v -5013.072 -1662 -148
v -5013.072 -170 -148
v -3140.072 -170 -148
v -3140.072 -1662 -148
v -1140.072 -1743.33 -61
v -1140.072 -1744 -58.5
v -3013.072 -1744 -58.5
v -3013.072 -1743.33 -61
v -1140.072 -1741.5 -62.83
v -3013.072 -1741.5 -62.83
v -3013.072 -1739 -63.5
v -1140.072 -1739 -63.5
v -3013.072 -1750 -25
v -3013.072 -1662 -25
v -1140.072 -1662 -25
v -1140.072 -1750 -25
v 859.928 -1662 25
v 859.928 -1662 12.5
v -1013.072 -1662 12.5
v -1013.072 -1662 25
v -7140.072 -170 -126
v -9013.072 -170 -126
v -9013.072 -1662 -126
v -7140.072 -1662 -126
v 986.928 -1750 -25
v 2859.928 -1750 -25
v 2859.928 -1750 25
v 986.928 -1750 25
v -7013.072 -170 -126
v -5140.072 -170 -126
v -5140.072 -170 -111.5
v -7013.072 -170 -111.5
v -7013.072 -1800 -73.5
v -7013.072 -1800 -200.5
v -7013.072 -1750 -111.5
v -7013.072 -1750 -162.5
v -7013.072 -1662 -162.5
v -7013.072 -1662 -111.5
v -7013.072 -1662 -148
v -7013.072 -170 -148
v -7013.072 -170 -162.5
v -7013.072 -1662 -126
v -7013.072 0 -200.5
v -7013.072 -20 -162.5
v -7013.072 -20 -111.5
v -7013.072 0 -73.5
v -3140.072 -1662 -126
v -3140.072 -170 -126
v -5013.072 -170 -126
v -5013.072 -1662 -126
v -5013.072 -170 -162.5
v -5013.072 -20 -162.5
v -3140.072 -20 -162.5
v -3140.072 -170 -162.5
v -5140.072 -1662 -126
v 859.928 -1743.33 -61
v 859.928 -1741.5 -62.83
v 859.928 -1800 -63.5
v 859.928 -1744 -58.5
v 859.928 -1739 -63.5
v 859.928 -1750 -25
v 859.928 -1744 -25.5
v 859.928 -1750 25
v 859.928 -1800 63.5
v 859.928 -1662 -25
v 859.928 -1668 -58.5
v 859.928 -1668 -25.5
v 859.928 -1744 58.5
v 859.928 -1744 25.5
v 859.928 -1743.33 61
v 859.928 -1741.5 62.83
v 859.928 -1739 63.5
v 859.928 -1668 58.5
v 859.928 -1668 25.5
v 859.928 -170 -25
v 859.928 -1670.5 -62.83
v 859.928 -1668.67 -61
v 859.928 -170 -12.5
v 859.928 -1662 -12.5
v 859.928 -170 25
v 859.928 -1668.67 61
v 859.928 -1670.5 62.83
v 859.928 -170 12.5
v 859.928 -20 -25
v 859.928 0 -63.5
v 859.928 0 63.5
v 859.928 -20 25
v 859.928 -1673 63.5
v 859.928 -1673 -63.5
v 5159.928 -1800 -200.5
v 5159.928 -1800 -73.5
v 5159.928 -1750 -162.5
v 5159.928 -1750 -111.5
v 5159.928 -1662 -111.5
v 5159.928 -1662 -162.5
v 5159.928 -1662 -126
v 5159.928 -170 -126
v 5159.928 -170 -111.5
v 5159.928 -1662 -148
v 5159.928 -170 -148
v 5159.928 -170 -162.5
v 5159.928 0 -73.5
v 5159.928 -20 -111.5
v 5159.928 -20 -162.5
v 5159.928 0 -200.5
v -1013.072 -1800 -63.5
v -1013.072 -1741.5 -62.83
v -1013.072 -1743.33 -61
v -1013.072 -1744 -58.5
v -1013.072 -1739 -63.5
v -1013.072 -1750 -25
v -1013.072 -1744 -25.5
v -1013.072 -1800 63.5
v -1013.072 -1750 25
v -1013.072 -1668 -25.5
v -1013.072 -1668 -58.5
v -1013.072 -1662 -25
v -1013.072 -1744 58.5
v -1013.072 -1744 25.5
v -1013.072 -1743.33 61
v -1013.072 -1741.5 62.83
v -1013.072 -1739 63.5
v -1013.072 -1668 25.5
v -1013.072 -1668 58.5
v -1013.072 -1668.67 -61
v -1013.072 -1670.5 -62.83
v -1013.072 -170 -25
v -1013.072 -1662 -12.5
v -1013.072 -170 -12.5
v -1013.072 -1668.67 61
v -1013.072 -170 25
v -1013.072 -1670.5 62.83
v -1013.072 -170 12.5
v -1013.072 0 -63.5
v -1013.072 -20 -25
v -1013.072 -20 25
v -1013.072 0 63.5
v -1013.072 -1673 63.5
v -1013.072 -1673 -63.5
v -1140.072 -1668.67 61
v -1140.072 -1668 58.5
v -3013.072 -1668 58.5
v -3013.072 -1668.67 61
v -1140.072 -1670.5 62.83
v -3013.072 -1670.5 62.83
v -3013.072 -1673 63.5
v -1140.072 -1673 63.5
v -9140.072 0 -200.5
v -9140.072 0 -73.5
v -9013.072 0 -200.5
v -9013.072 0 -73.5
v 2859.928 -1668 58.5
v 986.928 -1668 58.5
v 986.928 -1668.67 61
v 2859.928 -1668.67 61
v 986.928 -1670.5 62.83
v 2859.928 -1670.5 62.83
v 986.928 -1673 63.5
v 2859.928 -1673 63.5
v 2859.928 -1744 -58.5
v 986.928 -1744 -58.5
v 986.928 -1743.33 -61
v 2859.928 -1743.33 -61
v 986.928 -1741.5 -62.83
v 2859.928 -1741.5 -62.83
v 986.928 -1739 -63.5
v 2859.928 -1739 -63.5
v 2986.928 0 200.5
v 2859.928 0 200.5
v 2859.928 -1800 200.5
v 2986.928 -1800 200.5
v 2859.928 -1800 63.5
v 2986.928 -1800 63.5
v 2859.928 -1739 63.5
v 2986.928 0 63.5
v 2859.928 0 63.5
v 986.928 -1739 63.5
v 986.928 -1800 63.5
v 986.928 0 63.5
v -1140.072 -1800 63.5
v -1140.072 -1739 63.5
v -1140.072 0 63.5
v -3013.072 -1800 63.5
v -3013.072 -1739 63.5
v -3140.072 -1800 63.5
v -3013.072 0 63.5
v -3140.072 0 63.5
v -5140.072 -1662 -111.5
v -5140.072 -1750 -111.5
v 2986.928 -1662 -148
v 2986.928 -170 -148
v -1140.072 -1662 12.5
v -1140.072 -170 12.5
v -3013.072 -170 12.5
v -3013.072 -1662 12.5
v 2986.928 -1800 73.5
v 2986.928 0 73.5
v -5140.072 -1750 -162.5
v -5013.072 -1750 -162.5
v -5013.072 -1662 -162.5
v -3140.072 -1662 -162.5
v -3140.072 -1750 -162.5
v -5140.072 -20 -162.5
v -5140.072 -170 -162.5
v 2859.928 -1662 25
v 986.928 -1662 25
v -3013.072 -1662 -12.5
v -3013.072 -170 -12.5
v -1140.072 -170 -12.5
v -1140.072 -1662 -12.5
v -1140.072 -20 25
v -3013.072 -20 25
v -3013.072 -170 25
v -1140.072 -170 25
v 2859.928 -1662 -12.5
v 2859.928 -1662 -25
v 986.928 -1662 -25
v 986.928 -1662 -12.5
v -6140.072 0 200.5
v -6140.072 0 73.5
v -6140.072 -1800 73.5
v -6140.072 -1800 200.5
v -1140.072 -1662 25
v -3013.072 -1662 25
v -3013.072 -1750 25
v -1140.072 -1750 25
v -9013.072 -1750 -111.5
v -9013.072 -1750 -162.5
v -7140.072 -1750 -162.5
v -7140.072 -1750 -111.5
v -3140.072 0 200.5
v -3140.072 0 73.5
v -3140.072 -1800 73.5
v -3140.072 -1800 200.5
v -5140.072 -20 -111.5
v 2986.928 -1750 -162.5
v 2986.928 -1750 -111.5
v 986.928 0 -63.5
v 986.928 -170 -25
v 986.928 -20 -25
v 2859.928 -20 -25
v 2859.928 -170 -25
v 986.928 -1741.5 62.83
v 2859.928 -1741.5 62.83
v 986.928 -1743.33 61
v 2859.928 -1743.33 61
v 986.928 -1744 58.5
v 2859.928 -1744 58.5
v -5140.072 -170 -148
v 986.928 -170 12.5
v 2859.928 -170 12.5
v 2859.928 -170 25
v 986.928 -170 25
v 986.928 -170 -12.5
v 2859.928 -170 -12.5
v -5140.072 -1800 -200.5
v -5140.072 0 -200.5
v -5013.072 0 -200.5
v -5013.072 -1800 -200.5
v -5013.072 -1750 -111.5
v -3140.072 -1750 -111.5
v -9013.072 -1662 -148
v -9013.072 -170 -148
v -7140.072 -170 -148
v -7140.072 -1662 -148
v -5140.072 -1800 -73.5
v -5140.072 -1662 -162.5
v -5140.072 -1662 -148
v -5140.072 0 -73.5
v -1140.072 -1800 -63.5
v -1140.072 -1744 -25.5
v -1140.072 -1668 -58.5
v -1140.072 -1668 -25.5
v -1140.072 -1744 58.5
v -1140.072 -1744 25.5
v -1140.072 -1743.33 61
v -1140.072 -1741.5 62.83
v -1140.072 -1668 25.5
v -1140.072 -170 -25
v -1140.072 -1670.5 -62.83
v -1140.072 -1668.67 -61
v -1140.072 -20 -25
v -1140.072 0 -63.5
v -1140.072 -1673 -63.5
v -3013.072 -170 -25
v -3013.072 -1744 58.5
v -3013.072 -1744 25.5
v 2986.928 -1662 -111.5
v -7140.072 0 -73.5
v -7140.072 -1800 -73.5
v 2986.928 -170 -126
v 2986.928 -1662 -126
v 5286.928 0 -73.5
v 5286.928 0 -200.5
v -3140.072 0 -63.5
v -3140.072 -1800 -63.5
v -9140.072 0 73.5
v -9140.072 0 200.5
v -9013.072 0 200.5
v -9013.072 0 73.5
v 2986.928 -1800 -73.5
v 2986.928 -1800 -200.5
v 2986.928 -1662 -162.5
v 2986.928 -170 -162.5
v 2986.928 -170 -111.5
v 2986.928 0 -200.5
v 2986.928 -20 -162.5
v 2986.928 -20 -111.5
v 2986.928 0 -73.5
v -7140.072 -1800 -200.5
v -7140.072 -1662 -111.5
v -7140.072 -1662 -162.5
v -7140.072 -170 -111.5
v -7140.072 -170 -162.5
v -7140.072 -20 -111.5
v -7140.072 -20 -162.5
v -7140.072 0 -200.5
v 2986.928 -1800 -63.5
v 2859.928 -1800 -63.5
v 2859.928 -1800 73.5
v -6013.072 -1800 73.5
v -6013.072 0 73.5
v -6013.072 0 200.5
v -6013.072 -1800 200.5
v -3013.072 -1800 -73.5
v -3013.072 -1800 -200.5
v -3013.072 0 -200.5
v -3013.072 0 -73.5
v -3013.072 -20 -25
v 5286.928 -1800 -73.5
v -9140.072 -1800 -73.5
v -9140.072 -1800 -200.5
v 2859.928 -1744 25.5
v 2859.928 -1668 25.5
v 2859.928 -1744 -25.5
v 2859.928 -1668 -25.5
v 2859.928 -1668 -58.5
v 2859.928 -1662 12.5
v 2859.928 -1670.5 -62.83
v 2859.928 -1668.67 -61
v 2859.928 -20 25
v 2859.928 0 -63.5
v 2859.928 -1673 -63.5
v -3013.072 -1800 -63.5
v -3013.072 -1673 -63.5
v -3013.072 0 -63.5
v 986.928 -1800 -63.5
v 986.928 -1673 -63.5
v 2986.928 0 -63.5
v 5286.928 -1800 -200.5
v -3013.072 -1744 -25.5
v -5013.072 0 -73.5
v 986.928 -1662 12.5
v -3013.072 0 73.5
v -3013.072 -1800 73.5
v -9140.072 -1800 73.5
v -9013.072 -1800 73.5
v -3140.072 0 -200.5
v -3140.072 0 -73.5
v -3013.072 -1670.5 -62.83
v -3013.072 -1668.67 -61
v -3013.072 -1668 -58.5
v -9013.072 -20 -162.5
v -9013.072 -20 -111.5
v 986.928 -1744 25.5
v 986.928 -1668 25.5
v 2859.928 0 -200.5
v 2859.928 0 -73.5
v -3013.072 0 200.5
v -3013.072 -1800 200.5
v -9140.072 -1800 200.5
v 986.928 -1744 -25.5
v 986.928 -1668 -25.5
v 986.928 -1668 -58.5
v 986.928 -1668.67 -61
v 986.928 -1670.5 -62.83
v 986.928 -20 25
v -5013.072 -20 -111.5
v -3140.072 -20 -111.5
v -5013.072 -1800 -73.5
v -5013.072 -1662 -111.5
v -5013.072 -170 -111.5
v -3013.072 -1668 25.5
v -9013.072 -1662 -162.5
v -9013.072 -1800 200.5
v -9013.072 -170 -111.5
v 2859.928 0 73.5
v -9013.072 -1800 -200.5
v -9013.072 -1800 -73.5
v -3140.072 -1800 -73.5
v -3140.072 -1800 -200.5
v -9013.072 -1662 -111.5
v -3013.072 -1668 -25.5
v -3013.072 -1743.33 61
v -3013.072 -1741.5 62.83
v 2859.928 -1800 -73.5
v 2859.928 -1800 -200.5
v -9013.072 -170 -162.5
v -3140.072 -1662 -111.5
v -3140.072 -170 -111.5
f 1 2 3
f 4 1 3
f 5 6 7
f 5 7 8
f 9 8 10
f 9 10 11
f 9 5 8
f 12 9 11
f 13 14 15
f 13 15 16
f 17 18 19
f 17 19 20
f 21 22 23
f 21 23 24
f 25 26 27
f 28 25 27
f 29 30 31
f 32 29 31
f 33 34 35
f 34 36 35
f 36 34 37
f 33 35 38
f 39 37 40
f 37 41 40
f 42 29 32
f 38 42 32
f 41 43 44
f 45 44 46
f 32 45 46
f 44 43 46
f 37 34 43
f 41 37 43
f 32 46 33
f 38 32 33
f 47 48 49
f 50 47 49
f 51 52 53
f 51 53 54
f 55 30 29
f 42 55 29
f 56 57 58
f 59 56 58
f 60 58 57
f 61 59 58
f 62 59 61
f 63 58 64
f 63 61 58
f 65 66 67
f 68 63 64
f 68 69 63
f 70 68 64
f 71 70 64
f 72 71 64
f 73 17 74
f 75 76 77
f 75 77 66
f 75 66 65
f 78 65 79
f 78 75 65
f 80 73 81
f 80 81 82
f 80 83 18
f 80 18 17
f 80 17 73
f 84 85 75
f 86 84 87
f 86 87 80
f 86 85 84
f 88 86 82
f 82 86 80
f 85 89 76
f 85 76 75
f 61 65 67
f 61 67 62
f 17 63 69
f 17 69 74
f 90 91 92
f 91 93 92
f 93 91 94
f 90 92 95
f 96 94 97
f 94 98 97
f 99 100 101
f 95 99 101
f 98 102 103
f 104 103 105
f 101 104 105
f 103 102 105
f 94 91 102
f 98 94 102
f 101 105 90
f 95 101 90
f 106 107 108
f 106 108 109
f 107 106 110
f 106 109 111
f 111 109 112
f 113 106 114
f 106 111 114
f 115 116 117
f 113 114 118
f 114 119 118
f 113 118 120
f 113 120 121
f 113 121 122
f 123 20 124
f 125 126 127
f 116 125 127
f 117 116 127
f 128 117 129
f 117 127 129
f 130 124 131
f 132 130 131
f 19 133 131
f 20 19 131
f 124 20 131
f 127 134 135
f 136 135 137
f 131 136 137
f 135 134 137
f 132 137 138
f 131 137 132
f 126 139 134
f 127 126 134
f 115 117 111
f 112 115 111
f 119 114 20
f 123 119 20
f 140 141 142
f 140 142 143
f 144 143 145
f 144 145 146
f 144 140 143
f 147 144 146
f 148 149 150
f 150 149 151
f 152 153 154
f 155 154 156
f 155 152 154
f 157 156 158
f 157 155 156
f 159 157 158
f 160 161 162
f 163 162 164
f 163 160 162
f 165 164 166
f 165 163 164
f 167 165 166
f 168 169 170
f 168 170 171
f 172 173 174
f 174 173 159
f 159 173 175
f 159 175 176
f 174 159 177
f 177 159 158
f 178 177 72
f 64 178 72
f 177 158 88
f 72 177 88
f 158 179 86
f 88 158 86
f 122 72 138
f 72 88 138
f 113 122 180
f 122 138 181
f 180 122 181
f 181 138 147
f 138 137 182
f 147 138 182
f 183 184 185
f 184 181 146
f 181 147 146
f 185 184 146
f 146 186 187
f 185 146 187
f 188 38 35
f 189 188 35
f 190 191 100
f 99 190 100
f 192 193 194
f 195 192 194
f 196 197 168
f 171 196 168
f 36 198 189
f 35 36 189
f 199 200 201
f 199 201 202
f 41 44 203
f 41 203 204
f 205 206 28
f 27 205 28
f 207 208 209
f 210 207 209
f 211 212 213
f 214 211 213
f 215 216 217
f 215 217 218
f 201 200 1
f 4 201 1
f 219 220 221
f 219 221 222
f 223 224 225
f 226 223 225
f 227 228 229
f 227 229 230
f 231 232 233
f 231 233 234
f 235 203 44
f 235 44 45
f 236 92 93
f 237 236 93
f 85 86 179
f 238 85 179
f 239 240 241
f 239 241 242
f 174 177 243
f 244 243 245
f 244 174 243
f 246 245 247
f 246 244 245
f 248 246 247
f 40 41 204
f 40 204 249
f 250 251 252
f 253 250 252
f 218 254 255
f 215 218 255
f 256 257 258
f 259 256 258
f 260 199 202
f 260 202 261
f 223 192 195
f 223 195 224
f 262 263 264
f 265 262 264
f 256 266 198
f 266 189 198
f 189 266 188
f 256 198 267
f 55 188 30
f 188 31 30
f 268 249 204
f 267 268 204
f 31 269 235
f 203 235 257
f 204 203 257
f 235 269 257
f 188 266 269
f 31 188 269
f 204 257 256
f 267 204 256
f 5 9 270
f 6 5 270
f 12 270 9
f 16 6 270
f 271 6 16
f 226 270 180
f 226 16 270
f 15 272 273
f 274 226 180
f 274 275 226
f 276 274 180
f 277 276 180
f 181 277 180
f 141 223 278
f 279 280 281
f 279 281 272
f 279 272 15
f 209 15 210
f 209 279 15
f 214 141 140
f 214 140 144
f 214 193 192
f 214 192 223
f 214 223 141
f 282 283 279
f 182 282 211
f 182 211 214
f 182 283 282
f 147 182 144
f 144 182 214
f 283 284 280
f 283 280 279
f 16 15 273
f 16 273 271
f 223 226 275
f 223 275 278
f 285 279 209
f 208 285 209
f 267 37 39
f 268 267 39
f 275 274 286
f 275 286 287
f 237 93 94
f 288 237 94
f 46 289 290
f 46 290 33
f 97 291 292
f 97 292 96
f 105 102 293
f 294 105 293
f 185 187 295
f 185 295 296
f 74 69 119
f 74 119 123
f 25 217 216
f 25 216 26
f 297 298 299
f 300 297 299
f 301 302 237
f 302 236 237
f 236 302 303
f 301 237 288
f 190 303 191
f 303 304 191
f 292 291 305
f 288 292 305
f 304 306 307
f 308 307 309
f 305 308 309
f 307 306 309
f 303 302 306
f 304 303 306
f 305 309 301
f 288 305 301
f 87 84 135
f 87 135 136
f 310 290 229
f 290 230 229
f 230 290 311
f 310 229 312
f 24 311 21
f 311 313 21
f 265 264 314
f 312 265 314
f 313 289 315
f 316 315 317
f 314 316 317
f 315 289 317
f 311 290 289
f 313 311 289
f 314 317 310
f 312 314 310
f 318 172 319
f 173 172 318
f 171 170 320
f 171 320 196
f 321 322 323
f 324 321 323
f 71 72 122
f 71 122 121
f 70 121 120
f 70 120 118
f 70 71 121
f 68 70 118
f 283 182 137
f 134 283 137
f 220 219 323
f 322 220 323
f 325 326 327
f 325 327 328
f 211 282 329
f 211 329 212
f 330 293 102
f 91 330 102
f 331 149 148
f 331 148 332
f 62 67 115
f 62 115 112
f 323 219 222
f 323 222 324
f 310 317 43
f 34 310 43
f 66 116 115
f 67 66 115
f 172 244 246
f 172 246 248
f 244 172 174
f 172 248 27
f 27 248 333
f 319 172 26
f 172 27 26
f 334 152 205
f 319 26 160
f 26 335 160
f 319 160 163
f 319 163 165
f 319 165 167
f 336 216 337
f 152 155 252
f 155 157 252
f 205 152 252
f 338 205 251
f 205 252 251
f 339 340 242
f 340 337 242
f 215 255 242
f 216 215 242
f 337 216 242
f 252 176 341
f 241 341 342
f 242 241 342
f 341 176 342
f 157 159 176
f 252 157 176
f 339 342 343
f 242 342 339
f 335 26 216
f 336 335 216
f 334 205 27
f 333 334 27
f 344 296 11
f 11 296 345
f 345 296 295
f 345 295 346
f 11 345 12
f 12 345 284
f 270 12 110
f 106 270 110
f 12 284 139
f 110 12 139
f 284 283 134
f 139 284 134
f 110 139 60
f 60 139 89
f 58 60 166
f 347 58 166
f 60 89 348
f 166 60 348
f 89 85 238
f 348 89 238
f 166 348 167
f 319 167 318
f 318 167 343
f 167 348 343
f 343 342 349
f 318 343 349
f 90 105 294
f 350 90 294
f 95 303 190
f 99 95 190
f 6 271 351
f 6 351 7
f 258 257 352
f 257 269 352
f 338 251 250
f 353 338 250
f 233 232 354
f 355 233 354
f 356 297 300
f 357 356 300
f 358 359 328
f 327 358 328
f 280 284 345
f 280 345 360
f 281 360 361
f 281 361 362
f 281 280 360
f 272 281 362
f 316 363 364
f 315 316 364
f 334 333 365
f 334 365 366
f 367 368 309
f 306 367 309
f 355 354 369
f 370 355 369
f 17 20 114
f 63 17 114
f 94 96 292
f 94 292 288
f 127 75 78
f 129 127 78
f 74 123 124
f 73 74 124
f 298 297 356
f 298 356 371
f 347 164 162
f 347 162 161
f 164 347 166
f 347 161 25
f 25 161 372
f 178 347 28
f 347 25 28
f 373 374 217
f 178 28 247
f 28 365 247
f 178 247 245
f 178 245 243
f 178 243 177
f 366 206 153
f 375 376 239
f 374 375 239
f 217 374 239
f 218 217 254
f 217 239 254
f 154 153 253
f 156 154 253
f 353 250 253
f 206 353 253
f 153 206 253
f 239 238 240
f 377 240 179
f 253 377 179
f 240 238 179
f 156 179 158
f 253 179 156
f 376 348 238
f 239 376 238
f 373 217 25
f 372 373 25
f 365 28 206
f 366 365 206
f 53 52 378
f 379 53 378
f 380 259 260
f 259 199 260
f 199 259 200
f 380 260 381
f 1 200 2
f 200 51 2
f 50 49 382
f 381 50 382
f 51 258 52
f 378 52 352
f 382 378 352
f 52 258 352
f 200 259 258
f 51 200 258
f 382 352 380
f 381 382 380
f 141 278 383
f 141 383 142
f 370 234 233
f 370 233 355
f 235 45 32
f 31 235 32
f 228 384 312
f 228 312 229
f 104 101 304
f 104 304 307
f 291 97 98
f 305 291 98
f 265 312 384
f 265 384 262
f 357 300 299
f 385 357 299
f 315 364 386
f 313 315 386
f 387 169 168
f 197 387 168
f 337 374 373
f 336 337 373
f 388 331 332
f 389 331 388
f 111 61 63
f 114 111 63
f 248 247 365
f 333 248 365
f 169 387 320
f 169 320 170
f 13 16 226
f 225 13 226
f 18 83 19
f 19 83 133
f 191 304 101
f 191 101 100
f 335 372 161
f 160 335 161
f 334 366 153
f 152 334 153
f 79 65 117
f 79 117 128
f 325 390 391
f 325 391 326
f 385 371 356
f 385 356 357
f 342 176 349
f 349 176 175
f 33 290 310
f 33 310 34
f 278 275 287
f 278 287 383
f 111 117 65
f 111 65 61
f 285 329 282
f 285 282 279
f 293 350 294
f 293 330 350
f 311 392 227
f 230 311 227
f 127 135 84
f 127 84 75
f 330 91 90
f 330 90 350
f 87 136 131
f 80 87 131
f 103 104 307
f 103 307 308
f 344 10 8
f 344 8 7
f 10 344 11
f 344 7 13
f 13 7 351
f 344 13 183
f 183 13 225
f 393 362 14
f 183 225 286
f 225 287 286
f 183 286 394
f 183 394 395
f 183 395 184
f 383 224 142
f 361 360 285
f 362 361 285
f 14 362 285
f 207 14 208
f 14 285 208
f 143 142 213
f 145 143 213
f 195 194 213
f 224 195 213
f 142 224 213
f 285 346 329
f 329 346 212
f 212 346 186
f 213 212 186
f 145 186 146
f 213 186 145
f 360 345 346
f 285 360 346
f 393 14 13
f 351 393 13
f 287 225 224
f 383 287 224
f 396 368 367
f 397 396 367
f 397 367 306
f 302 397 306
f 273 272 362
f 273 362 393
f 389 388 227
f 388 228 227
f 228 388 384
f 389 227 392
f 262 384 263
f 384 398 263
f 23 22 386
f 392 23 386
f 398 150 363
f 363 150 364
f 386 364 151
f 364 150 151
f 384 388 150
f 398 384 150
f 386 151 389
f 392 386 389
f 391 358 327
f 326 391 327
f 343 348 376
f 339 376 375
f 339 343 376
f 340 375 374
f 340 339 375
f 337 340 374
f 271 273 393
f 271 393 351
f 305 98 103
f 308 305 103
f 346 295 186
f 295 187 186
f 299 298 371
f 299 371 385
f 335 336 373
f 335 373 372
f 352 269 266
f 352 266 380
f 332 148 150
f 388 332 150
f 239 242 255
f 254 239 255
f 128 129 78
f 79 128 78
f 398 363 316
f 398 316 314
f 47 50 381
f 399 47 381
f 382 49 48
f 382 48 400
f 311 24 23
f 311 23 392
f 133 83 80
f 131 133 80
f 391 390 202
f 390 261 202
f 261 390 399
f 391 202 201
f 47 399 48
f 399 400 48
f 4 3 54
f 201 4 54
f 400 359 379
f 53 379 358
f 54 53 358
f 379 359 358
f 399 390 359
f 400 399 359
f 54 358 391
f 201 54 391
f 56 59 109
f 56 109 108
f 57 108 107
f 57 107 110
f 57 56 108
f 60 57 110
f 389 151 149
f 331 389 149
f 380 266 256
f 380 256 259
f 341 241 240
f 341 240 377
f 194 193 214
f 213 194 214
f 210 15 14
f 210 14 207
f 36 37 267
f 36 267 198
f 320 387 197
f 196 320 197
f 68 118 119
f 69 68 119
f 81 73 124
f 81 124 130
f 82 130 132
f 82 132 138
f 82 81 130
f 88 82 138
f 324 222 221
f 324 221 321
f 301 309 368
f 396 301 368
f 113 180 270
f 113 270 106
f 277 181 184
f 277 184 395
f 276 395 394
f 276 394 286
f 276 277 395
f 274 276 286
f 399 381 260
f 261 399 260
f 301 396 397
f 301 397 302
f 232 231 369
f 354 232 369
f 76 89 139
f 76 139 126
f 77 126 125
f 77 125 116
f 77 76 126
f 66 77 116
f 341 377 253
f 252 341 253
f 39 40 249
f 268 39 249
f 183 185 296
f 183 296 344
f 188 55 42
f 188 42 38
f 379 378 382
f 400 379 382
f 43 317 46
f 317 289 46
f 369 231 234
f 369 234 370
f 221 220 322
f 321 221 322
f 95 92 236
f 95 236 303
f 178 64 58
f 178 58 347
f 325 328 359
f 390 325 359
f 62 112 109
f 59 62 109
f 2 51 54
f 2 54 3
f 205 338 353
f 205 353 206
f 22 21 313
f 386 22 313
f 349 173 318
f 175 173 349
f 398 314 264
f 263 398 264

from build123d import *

# Parameters (mm, degrees)
F0_W        = 1873
F0_H        = 25
F0_W_2      = 63.5
F0_W_3      = 127
F0_H_2      = 51
F1_DEPTH    = 1800
F2_W        = 150
F2_H        = 50
F2_W_2      = 88
F3_DEPTH    = 6000
F4_DEPTH    = 50
F0_H_3      = 127
F5_DEPTH    = 1800
F0_H_4      = 22
F0_H_5      = 52.5
F0_W_4      = 2173
F6_W        = 150
F6_H        = 51
F6_W_2      = 88
F7_DEPTH    = 2370
F8_W        = 150
F8_H        = 51
F8_W_2      = 88
F9_DEPTH    = 6090
F7_FACE_W   = 2173
F7_FACE_H   = 50
F7_FACE_H_2 = 20
F9_FACE_W   = 1873
F9_FACE_H   = 50
F9_FACE_H_2 = 20
F10_DEPTH   = 50
F12_DEPTH   = 6000


with BuildPart() as f1:
    # F0 (on Front) → F1 (new body)
    with BuildSketch(Plane.XZ):
        with Locations((-2076.5718817711, 0)):
            Rectangle(F0_W, F0_H)
        with Locations((-3044.8218817711, 0)):
            Rectangle(F0_W_2, F0_H)
        with Locations((-1076.5718817711, 0)):
            Rectangle(F0_W_3, F0_H)
        with Locations((-76.5718817711, 0)):
            Rectangle(F0_W, F0_H)
        with Locations((923.4281182289, 0)):
            Rectangle(F0_W_3, F0_H)
        with Locations((1923.4281182289, 0)):
            Rectangle(F0_W, F0_H)
        with Locations((2891.6781182289, 0)):
            Rectangle(F0_W_2, F0_H)
        Polygon((-3013.0718817711, -63.5), (-3013.0718817711, -12.5), (-3076.5718817711, -12.5), (-3076.5718817711, 12.5), (-3013.0718817711, 12.5), (-3013.0718817711, 63.5), (-3140.0718817711, 63.5), (-3140.0718817711, -63.5), align=None)
        with Locations((-1076.5718817711, -38)):
            Rectangle(F0_W_3, F0_H_2)
        with Locations((-1076.5718817711, 38)):
            Rectangle(F0_W_3, F0_H_2)
        with Locations((923.4281182289, -38)):
            Rectangle(F0_W_3, F0_H_2)
        with Locations((923.4281182289, 38)):
            Rectangle(F0_W_3, F0_H_2)
        Polygon((2923.4281182289, 12.5), (2923.4281182289, -12.5), (2859.9281182289, -12.5), (2859.9281182289, -63.5), (2986.9281182289, -63.5), (2986.9281182289, 63.5), (2859.9281182289, 63.5), (2859.9281182289, 12.5), align=None)
    extrude(amount=F1_DEPTH)

    # F2 (on face) → F3 (join)
    with BuildSketch(Plane(origin=(-3140.0718817711, 0, 0), x_dir=(0, -1, 0), z_dir=(-1, 0, 0))):
        with Locations((95, 0)):
            Rectangle(F2_W, F2_H)
        with Locations((1706, 0)):
            Rectangle(F2_W_2, F2_H)
    extrude(amount=-F3_DEPTH)

    # F4 (cut): faces of the model
    f4_faces = [f1.faces().sort_by_distance(p)[0] for p in [
        (1923.4281182289, -1775, 12.5),
        (-76.5718817711, -1775, 12.5),
        (-2076.5718817711, -1775, 12.5),
        (-2076.5718817711, -10, 12.5),
        (-76.5718817711, -10, 12.5),
        (1923.4281182289, -10, 12.5),
    ]]
    extrude(f4_faces, amount=-F4_DEPTH, mode=Mode.SUBTRACT)

    # F11 (on face) → F12 (join)
    with BuildSketch(Plane.YZ.offset(2986.9281182289)):
        with BuildLine():
            Line((-1668, -58.5), (-1668, -25.5))
            Line((-1668, -25.5), (-1744, -25.5))
            Line((-1744, -25.5), (-1744, -58.5))
            ThreePointArc((-1744, -58.5), (-1742.5355339059, -62.0355339059), (-1739, -63.5))
            Line((-1739, -63.5), (-1673, -63.5))
            ThreePointArc((-1673, -63.5), (-1669.4644660941, -62.0355339059), (-1668, -58.5))
        make_face()
        with BuildLine():
            Line((-1744, 25.5), (-1668, 25.5))
            Line((-1668, 25.5), (-1668, 58.5))
            ThreePointArc((-1668, 58.5), (-1669.4644660941, 62.0355339059), (-1673, 63.5))
            Line((-1673, 63.5), (-1739, 63.5))
            ThreePointArc((-1739, 63.5), (-1742.5355339059, 62.0355339059), (-1744, 58.5))
            Line((-1744, 58.5), (-1744, 25.5))
        make_face()
    extrude(amount=-F12_DEPTH)


with BuildPart() as f5:
    # F0 (on Front) → F5 (new body)
    with BuildSketch(Plane.XZ):
        with Locations((-3076.5718817711, 137)):
            Rectangle(F0_W_3, F0_H_3)
    extrude(amount=F5_DEPTH)


with BuildPart() as f5b:
    # F0 (on Front) → F5, piece 2 (new body)
    with BuildSketch(Plane.XZ):
        Polygon((-3140.0718817711, -200.5), (-3013.0718817711, -200.5), (-3013.0718817711, -73.5), (-3140.0718817711, -73.5), (-3140.0718817711, -126), (-3140.0718817711, -148), align=None)
        with Locations((-4076.5718817711, -137)):
            Rectangle(F0_W, F0_H_4)
        with Locations((-5076.5718817711, -174.25)):
            Rectangle(F0_W_3, F0_H_5)
        with Locations((-5076.5718817711, -137)):
            Rectangle(F0_W_3, F0_H_4)
        with Locations((-5076.5718817711, -99.75)):
            Rectangle(F0_W_3, F0_H_5)
        with Locations((-6076.5718817711, -137)):
            Rectangle(F0_W, F0_H_4)
        with Locations((-7076.5718817711, -174.25)):
            Rectangle(F0_W_3, F0_H_5)
        with Locations((-7076.5718817711, -137)):
            Rectangle(F0_W_3, F0_H_4)
        with Locations((-7076.5718817711, -99.75)):
            Rectangle(F0_W_3, F0_H_5)
        with Locations((-8076.5718817711, -137)):
            Rectangle(F0_W, F0_H_4)
        Polygon((-9013.0718817711, -200.5), (-9013.0718817711, -148), (-9013.0718817711, -126), (-9013.0718817711, -73.5), (-9140.0718817711, -73.5), (-9140.0718817711, -200.5), align=None)
    extrude(amount=F5_DEPTH)

    # F8 (on face) → F9 (join)
    with BuildSketch(Plane(origin=(-9140.0718817711, 0, 0), x_dir=(0, -1, 0), z_dir=(-1, 0, 0))):
        with Locations((95, -137)):
            Rectangle(F8_W, F8_H)
        with Locations((1706, -137)):
            Rectangle(F8_W_2, F8_H)
    extrude(amount=-F9_DEPTH)


with BuildPart() as f5c:
    # F0 (on Front) → F5, piece 3 (new body)
    with BuildSketch(Plane.XZ):
        with Locations((-6076.5718817711, 137)):
            Rectangle(F0_W_3, F0_H_3)
    extrude(amount=F5_DEPTH)


with BuildPart() as f5d:
    # F0 (on Front) → F5, piece 4 (new body)
    with BuildSketch(Plane.XZ):
        with Locations((-9076.5718817711, 137)):
            Rectangle(F0_W_3, F0_H_3)
    extrude(amount=F5_DEPTH)


with BuildPart() as f5e:
    # F0 (on Front) → F5, piece 5 (new body)
    with BuildSketch(Plane.XZ):
        Polygon((2859.9281182289, -200.5), (2986.9281182289, -200.5), (2986.9281182289, -148), (2986.9281182289, -126), (2986.9281182289, -73.5), (2859.9281182289, -73.5), align=None)
        with Locations((4073.4281182289, -137)):
            Rectangle(F0_W_4, F0_H_4)
        Polygon((5159.9281182289, -126), (5159.9281182289, -148), (5159.9281182289, -200.5), (5286.9281182289, -200.5), (5286.9281182289, -73.5), (5159.9281182289, -73.5), align=None)
    extrude(amount=F5_DEPTH)

    # F6 (on face) → F7 (join)
    with BuildSketch(Plane.YZ.offset(5286.9281182289)):
        with Locations((-95, -137)):
            Rectangle(F6_W, F6_H)
        with Locations((-1706, -137)):
            Rectangle(F6_W_2, F6_H)
    extrude(amount=-F7_DEPTH)


with BuildPart() as f5f:
    # F0 (on Front) → F5, piece 6 (new body)
    with BuildSketch(Plane.XZ):
        with Locations((2923.4281182289, 137)):
            Rectangle(F0_W_3, F0_H_3)
    extrude(amount=F5_DEPTH)


with BuildPart() as f10_tool:
    # F7_face (on face) + F9_face (on face) → F10 (new body)
    with BuildSketch(Plane(origin=(4073.4281182289, -1775, -148), x_dir=(1, 0, 0), z_dir=(0, 0, -1))):
        Rectangle(F7_FACE_W, F7_FACE_H)
        with Locations((0, -1765)):
            Rectangle(F7_FACE_W, F7_FACE_H_2)
    with BuildSketch(Plane(origin=(-4076.5718817711, -1775, -148), x_dir=(1, 0, 0), z_dir=(0, 0, -1))):
        Rectangle(F9_FACE_W, F9_FACE_H)
        with Locations((-2000, 0)):
            Rectangle(F9_FACE_W, F9_FACE_H)
        with Locations((-4000, 0)):
            Rectangle(F9_FACE_W, F9_FACE_H)
        with Locations((-4000, -1765)):
            Rectangle(F9_FACE_W, F9_FACE_H_2)
        with Locations((-2000, -1765)):
            Rectangle(F9_FACE_W, F9_FACE_H_2)
        with Locations((0, -1765)):
            Rectangle(F9_FACE_W, F9_FACE_H_2)
    extrude(amount=-F10_DEPTH)


with BuildPart() as f5b_1:
    add(f5b.part)

    # F10: cut by f10_tool
    add(f10_tool.part, mode=Mode.SUBTRACT)


with BuildPart() as f5e_1:
    add(f5e.part)

    # F10: cut by f10_tool
    add(f10_tool.part, mode=Mode.SUBTRACT)


solid = Compound([f1.part, f5.part, f5c.part, f5d.part, f5f.part, f5b_1.part, f5e_1.part])
